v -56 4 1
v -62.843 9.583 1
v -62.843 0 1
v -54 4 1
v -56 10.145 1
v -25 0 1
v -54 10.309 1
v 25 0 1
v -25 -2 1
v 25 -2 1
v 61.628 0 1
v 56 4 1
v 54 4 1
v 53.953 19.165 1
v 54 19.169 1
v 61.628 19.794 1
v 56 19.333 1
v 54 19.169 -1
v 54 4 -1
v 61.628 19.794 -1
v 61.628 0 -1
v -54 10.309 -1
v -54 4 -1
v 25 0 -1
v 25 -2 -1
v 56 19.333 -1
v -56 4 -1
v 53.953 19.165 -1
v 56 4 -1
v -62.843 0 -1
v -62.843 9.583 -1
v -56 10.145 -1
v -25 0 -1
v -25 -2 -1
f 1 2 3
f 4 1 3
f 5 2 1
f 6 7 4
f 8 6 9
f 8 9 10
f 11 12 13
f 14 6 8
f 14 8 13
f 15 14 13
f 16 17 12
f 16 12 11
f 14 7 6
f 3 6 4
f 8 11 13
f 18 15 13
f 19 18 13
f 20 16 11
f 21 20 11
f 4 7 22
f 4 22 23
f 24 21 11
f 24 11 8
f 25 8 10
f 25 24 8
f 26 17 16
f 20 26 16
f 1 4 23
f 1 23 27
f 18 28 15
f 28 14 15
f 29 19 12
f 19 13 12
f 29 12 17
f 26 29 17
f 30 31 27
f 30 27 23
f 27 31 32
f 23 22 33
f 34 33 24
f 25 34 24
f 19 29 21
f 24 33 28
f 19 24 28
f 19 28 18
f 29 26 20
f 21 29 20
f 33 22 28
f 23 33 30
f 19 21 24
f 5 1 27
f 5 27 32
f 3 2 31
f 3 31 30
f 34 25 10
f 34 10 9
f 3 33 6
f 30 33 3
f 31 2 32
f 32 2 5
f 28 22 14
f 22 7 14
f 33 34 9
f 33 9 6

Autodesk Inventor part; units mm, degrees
ref_plane "YZ Plane" through (0, 0, 0) normal (1, 0, 0) x (0, 1, 0)
ref_plane "XZ Plane" through (0, 0, 0) normal (0, 1, 0) x (-1, 0, 0)
ref_plane "XY Plane" through (0, 0, 0) normal (0, 0, 1) x (1, 0, 0)
sketch "Sketch1" plane through (0, 0, 0) normal (0, 0, 1) x (1, 0, 0)
  line L0 (-64, 50) -> (64, 50)
  line L1 (64, 50) -> (64, 0)
  line L2 (64, 0) -> (-64, 0)
  line L3 (-64, 0) -> (-64, 50)
  line L4 (-25, 0) -> (25, 0)
  line L5 (25, 0) -> (25, -2)
  line L6 (25, -2) -> (-25, -2)
  line L7 (-25, -2) -> (-25, 0)
  point P0 (0, 0)
  point P1 (0, 0)
  dimension "d0" = 128
  dimension "d1" = 50
  dimension "d2" = 50
  dimension "d3" = 2
extrude "Extrusion1" add sketch "Sketch1" along normal mid plane 2
sketch "Sketch2" plane through (0, 0, 1) normal (0, 0, 1) x (1, 0, 0)
  line L0 (53.9533, 19.1647) -> (54.2948, 15.001) projected
  line L1 (54.2948, 15.001) -> (-55.3369, 6.0072) projected
  line L2 (-55.3369, 6.0072) -> (-55.6784, 10.1709) projected
  line L3 (-55.6784, 10.1709) -> (53.9533, 19.1647) projected
  line L4 (62.1376, 13.5765) -> (61.7855, 17.8679) projected
  line L5 (-63.1946, 7.615) -> (-62.8426, 3.3235) projected
  point P0 (0, 0)
sketch "Sketch3" plane through (0, 0, 1) normal (0, 0, 1) x (1, 0, 0)
  line L0 (-62.8426, 9.5832) -> (61.6275, 19.7943)
  line L1 (-55.6784, 10.1709) -> (53.9533, 19.1647) projected
  line L2 (-63.1946, 7.615) -> (-62.8426, 3.3235) construction
  line L3 (62.1376, 13.5765) -> (61.7855, 17.8679) construction
  line L4 (-62.8426, 9.5832) -> (-62.8426, 0)
  line L5 (-64, 0) -> (-25, 0) projected
  line L6 (61.6275, 19.7943) -> (61.6275, 0)
  line L7 (61.6275, 19.7943) -> (62.7021, 6.6951) construction
  line L8 (-62.8426, 0) -> (-72.8426, 0)
  line L9 (-72.8426, 0) -> (-72.8426, 60)
  line L10 (-72.8426, 60) -> (71.6275, 60)
  line L11 (71.6275, 60) -> (71.6275, 0)
  line L12 (71.6275, 0) -> (61.6275, 0)
  point P0 (0, 0)
  dimension "d6" = 10
  dimension "d7" = 10
  dimension "d8" = 60
extrude "Extrusion2" cut sketch "Sketch3" against normal through all
sketch "Sketch4" plane through (0, 0, 1) normal (0, 0, 1) x (1, 0, 0)
  line L0 (56, 0) -> (56, 19.4013) projected
  line L1 (54, 0) -> (56, 0) projected
  line L2 (54, 19.4013) -> (54, 0) projected
  line L3 (54, 19.4013) -> (56, 19.4013) projected
  line L4 (-54, 0) -> (-54, 10.4075) projected
  line L5 (-56, 0) -> (-54, 0) projected
  line L6 (-56, 10.4075) -> (-56, 0) projected
  line L7 (-56, 10.4075) -> (-54, 10.4075) projected
  point P0 (0, 0)
sketch "Sketch5" plane through (0, 0, 1) normal (0, 0, 1) x (1, 0, 0)
  line L0 (-56, 10.4075) -> (-56, 0) construction
  line L1 (-54, 0) -> (-54, 10.4075) construction
  line L2 (54, 19.4013) -> (54, 0) construction
  line L3 (56, 0) -> (56, 19.4013) construction
  line L4 (-54, 4) -> (-56, 4)
  line L5 (-56, 4) -> (-56, 24)
  line L6 (-56, 24) -> (-54, 24)
  line L7 (-54, 24) -> (-54, 4)
  line L8 (56, 24) -> (54, 24)
  line L9 (54, 24) -> (54, 4)
  line L10 (54, 4) -> (56, 4)
  line L11 (56, 4) -> (56, 24)
  line L12 (25, 0) -> (61.6275, 0) projected
  line L13 (-62.8426, 0) -> (-25, 0) projected
  point P0 (0, 0)
  dimension "d11" = 4
  dimension "d12" = 20
  dimension "d13" = 4
  dimension "d14" = 20
extrude "Extrusion3" cut sketch "Sketch5" against normal through all
properties part number "angle_plate_long_tall"
